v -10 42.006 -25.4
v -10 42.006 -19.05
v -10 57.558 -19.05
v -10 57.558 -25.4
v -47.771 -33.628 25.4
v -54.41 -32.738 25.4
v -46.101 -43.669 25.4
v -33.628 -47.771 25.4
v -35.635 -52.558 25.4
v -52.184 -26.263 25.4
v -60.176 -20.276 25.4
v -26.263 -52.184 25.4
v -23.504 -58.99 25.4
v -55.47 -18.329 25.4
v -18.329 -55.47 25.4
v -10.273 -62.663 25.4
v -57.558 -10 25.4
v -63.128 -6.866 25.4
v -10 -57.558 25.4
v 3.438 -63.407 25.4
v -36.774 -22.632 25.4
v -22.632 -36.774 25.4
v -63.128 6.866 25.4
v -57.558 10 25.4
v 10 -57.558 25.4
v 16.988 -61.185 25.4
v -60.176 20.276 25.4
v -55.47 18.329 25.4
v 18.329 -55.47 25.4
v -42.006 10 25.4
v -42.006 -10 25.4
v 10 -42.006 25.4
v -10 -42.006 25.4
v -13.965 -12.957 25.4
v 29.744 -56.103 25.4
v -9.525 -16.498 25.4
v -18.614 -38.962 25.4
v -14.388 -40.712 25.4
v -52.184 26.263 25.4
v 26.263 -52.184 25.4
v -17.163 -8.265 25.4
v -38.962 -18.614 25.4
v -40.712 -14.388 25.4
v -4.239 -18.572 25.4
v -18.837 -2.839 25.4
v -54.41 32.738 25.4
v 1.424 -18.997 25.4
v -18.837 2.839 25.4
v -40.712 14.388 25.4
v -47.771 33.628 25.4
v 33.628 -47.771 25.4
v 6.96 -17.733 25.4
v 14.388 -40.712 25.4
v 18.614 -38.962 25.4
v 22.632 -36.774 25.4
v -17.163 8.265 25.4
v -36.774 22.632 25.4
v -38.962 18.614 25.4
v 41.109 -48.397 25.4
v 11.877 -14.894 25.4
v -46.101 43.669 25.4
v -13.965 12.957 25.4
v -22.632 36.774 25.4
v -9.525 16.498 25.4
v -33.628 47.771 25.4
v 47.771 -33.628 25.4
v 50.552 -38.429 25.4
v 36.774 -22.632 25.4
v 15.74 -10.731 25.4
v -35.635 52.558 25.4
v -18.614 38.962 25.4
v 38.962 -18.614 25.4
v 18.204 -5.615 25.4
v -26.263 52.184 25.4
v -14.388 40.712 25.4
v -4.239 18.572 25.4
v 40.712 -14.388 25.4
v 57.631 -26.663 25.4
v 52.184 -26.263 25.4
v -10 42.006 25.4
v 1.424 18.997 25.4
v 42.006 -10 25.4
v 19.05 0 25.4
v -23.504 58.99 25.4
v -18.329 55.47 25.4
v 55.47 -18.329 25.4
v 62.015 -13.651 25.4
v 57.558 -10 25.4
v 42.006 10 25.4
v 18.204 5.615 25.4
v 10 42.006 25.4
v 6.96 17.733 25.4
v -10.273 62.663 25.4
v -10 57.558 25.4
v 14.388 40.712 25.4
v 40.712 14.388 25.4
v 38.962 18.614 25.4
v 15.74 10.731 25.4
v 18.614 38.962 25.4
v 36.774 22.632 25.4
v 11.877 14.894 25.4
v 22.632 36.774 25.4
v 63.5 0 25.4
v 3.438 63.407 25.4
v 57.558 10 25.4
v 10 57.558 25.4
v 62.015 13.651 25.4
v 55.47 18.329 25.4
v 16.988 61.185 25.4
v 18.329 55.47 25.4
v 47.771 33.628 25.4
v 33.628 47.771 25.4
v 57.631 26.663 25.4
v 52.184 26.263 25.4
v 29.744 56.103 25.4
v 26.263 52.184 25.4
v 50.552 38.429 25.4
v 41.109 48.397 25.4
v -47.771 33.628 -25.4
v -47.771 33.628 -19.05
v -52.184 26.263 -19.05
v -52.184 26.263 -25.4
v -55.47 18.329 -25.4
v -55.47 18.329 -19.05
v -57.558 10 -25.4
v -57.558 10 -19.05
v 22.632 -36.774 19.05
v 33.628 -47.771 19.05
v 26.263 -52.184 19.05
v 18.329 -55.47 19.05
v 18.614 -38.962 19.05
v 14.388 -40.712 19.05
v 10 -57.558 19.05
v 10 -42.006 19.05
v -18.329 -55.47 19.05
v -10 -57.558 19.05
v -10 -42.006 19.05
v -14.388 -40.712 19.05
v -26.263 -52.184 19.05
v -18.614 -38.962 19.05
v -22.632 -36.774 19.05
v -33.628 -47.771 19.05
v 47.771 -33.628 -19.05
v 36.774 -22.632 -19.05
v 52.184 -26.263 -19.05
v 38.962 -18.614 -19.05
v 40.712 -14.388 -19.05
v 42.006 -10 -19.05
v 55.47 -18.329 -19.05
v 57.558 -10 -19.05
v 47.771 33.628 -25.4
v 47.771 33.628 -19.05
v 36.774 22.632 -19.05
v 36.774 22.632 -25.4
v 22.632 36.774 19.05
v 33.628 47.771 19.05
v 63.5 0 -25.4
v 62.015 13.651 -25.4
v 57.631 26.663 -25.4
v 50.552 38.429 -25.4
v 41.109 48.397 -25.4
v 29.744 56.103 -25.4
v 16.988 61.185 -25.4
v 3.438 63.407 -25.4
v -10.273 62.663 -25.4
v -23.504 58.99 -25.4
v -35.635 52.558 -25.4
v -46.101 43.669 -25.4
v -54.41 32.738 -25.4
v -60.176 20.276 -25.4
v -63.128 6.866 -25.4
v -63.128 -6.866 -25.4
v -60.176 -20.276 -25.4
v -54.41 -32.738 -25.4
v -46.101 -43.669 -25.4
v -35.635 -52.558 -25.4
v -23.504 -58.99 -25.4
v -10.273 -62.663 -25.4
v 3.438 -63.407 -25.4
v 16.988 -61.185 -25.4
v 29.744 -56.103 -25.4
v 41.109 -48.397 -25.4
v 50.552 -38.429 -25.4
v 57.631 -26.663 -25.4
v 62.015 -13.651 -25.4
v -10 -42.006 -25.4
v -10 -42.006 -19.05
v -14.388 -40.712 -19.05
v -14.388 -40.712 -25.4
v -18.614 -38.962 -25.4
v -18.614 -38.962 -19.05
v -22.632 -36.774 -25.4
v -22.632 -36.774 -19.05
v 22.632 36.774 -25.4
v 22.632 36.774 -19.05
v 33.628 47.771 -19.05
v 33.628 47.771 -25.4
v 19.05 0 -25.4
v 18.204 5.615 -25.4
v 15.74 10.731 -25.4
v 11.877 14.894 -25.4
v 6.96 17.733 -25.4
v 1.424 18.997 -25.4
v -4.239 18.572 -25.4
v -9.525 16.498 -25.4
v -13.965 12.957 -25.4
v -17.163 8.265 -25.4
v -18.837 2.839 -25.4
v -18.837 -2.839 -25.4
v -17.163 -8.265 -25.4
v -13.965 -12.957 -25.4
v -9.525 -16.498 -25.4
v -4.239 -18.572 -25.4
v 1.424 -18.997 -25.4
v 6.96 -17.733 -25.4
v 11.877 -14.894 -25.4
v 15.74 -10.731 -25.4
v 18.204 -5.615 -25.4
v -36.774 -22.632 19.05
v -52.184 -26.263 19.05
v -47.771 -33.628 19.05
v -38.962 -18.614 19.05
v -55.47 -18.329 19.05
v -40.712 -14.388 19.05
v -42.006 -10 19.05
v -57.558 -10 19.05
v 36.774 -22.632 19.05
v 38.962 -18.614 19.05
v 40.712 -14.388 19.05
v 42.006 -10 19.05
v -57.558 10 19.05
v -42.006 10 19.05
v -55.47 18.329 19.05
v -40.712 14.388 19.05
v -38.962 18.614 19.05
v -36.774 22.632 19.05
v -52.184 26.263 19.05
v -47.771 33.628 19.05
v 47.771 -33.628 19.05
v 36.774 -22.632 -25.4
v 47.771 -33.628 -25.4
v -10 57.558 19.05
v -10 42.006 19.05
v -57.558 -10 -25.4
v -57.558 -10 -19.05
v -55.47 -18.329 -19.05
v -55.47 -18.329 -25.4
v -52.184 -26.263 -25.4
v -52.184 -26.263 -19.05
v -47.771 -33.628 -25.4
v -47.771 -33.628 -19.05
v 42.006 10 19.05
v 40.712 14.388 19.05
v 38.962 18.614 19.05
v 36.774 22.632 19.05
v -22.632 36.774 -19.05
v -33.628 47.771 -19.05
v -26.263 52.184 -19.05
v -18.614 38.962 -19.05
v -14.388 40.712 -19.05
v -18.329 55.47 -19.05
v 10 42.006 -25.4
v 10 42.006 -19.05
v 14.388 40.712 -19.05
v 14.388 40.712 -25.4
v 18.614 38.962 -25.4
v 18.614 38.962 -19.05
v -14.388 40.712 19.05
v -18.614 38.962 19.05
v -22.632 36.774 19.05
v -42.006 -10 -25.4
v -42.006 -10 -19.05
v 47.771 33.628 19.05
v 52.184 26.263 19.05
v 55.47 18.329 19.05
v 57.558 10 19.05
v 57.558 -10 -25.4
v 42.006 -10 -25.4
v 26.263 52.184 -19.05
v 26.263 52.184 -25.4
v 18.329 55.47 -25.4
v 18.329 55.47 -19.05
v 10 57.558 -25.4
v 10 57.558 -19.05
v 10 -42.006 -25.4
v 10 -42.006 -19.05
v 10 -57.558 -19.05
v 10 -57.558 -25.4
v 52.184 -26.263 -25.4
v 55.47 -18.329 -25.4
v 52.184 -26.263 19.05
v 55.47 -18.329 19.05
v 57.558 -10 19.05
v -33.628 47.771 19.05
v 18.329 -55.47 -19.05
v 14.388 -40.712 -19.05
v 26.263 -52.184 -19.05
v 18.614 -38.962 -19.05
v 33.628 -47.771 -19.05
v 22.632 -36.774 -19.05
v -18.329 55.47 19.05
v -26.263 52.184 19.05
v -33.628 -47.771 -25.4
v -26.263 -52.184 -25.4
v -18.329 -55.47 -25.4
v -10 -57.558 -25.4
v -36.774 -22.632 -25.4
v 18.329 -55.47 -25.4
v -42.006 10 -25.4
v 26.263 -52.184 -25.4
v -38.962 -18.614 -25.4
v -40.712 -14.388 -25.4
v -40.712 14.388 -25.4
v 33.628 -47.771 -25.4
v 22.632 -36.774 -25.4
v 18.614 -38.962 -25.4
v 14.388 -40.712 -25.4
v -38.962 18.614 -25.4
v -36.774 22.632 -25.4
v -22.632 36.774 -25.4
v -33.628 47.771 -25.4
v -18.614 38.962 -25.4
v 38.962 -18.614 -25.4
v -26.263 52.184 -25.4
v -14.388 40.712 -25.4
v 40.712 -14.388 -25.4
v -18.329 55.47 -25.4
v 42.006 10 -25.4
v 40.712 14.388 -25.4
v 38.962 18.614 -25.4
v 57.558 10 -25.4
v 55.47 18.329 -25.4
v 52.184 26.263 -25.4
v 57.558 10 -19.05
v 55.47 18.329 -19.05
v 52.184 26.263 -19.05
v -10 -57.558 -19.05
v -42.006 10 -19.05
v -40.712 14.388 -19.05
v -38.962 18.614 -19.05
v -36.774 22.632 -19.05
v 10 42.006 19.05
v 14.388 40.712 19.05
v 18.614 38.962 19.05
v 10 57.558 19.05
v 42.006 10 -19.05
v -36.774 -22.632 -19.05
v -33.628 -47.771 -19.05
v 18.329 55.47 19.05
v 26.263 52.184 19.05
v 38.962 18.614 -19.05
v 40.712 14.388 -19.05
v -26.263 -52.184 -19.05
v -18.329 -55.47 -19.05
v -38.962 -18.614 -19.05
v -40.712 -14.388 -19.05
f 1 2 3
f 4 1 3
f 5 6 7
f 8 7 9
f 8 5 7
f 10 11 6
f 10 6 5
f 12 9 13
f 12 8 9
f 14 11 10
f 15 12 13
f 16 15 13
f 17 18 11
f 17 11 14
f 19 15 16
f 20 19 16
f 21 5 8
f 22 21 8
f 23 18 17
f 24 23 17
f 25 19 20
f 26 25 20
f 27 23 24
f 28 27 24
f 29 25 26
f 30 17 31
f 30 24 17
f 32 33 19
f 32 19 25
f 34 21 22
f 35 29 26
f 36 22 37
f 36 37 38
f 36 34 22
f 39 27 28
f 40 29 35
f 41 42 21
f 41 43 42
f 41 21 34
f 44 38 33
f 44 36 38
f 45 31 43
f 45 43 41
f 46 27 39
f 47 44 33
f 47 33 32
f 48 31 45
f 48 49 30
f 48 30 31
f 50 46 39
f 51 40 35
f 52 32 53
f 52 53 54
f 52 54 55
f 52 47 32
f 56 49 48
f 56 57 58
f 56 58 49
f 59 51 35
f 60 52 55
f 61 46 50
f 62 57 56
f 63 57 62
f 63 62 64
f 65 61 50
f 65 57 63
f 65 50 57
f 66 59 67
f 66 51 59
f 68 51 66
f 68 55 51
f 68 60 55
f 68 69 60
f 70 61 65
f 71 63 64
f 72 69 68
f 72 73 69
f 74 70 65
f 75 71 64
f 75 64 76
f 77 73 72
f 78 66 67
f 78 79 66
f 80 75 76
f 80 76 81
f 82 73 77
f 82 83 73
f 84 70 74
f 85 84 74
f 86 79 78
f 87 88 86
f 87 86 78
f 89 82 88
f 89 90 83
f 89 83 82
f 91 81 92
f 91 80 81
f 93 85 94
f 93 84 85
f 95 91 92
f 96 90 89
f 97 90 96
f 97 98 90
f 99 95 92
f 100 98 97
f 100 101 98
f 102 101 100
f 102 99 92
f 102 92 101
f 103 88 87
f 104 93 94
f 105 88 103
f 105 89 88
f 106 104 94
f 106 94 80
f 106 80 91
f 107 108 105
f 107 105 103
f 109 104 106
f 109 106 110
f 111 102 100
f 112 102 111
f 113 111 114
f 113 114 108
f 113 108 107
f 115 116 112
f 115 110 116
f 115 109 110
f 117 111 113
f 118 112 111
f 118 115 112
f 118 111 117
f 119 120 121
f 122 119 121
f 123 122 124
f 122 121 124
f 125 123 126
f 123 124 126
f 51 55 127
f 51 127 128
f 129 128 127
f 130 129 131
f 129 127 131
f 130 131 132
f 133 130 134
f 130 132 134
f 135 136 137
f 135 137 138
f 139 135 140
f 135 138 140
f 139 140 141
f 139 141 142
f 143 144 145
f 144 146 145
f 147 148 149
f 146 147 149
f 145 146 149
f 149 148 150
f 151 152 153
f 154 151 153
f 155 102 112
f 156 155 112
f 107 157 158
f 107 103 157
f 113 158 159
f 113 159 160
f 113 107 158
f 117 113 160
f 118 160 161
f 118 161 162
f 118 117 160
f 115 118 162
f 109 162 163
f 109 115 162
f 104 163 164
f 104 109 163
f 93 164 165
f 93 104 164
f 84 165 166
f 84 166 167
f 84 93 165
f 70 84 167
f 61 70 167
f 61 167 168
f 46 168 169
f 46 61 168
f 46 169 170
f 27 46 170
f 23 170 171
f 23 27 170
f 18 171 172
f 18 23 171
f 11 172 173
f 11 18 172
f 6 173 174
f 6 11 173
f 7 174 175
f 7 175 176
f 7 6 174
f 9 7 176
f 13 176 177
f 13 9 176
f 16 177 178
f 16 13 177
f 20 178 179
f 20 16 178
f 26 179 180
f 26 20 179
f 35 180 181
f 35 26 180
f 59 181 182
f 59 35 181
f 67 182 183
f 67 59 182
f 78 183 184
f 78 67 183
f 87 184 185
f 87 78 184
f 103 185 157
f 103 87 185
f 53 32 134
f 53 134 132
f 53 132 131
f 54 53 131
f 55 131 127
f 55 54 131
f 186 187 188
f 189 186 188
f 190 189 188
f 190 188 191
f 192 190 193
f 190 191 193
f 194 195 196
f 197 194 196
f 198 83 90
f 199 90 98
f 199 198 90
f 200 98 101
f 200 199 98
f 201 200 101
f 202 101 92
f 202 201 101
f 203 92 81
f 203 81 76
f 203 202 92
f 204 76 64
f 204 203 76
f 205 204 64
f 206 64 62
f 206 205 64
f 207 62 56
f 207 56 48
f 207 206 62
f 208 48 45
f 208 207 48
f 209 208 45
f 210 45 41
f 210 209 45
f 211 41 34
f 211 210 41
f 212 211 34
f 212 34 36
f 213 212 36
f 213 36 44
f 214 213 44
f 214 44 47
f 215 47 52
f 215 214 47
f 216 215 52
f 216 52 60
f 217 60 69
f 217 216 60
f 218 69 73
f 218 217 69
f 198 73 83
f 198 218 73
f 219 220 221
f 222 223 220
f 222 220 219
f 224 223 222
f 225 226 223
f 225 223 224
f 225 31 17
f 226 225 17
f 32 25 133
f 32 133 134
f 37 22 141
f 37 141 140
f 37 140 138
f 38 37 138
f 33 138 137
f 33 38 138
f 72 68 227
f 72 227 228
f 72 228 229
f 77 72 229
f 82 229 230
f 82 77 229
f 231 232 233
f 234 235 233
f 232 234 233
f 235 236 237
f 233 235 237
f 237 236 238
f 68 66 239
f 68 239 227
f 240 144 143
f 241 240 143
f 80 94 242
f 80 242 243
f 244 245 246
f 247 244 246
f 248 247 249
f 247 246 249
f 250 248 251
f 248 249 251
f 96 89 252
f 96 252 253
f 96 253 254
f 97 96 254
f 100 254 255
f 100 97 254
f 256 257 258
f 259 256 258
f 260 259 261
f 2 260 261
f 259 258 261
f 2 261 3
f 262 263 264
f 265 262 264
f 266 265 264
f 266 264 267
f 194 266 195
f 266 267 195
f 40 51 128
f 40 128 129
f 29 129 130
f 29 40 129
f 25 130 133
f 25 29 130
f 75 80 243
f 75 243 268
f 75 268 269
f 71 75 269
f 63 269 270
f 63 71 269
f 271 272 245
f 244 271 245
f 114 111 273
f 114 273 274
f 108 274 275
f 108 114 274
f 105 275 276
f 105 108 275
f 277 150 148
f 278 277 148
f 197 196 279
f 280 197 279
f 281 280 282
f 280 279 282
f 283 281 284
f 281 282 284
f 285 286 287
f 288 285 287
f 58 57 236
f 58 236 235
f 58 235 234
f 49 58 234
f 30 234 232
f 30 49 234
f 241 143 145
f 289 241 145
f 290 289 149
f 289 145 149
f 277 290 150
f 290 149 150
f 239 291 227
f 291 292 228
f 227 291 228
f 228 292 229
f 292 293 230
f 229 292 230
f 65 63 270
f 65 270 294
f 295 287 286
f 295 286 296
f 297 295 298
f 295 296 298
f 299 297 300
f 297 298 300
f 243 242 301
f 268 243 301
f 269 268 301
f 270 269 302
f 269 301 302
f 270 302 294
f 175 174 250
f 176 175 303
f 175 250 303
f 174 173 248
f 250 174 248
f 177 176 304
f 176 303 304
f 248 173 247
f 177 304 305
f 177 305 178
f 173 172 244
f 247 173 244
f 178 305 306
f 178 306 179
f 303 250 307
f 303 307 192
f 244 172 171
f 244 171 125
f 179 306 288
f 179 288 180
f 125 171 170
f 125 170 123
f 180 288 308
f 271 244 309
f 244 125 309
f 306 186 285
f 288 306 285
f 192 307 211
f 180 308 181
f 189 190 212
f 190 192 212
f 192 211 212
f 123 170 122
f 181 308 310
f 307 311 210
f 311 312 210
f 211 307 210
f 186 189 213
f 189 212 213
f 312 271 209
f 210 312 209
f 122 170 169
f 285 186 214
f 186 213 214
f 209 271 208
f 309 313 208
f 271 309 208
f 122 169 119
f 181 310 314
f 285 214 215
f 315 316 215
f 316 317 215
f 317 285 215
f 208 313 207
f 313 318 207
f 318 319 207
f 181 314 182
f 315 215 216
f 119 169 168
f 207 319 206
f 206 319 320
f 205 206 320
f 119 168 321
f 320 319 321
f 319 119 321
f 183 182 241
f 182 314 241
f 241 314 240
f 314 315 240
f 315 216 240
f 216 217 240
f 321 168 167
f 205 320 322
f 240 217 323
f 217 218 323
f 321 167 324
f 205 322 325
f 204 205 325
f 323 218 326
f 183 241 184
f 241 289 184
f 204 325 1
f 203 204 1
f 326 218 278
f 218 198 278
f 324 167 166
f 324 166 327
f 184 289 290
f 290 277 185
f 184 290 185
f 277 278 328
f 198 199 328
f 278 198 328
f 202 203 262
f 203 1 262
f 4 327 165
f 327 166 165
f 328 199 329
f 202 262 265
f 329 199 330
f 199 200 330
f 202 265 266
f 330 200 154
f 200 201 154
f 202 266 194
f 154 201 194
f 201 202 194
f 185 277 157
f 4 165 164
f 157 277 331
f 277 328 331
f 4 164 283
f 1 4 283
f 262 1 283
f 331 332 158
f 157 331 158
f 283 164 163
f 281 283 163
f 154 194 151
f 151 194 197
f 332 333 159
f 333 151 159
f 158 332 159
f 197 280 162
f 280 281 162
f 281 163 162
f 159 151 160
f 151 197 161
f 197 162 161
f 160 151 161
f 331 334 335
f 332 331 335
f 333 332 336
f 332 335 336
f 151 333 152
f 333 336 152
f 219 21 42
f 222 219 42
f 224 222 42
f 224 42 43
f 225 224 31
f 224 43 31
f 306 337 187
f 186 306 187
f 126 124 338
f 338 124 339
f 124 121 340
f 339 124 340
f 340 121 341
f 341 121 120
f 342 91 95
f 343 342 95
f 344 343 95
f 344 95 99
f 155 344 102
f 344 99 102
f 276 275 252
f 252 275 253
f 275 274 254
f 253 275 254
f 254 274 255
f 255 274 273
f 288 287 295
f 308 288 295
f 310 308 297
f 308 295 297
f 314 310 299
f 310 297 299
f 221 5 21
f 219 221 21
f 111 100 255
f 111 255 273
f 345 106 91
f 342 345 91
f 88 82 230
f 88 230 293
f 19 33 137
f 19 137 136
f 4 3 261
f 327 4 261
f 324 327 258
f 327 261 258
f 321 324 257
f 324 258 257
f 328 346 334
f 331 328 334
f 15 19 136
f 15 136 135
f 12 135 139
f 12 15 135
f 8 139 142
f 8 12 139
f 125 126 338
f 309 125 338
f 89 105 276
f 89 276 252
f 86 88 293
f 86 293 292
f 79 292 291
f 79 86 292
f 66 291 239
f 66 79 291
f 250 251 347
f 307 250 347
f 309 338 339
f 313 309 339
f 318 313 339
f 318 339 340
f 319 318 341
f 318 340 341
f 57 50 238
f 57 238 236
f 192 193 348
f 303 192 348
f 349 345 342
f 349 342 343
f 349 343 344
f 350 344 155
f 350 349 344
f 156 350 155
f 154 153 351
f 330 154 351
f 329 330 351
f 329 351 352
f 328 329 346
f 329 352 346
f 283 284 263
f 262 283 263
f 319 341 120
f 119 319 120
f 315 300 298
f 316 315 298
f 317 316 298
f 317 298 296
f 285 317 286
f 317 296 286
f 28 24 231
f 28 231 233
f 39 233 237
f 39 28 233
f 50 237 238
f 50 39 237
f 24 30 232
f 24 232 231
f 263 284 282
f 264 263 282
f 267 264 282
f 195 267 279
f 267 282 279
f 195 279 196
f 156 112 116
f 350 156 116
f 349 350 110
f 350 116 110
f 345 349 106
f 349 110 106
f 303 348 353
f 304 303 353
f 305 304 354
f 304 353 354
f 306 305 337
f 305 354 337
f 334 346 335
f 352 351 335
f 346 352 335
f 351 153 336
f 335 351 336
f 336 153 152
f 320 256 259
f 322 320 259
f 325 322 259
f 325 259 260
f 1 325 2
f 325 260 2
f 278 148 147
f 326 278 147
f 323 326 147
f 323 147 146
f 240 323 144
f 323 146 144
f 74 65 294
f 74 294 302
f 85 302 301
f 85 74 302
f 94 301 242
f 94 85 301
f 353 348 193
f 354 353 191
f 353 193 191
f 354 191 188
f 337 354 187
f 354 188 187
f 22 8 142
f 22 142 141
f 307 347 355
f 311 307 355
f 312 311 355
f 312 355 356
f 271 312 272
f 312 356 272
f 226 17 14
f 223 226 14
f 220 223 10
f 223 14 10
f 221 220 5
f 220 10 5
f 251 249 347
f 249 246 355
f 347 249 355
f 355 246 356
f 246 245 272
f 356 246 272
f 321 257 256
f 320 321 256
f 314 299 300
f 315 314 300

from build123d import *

# Parameters (mm, degrees)
SKETCH1_R           = 63.5
SKETCH1_R_2         = 19.05
BOSS_EXTRUDE1_DEPTH = 25.4
CUT_EXTRUDE1_DEPTH  = 6.35
CUT_EXTRUDE2_START  = -6.35
CUT_EXTRUDE2_DEPTH  = 6.35


with BuildPart() as part:
    # Sketch1 → Boss-Extrude1 (new, symmetric)
    with BuildSketch(Plane.XY):
        Circle(SKETCH1_R)
        Circle(SKETCH1_R_2, mode=Mode.SUBTRACT)
    extrude(amount=BOSS_EXTRUDE1_DEPTH, both=True)

    # Sketch3 → Cut-Extrude1 (cut)
    with BuildSketch(Plane.XY.offset(25.4)):
        with BuildLine():
            Line((36.77386566, 22.631730036), (47.770554295, 33.628418671))
            ThreePointArc((47.770554295, 33.628418671), (53.973042289, 22.356366119), (57.557765766, 10))
            Line((57.557765766, 10), (42.006099557, 10))
            ThreePointArc((42.006099557, 10), (39.893118214, 16.52427061), (36.77386566, 22.631730036))
        make_face()
        with BuildLine():
            Line((47.770554295, -33.628418671), (36.77386566, -22.631730036))
            ThreePointArc((36.77386566, -22.631730036), (39.893118214, -16.52427061), (42.006099557, -10))
            Line((42.006099557, -10), (57.557765766, -10))
            ThreePointArc((57.557765766, -10), (53.973042289, -22.356366119), (47.770554295, -33.628418671))
        make_face()
        with BuildLine():
            Line((10, -57.557765766), (10, -42.006099557))
            ThreePointArc((10, -42.006099557), (16.52427061, -39.893118214), (22.631730036, -36.77386566))
            Line((22.631730036, -36.77386566), (33.628418671, -47.770554295))
            ThreePointArc((33.628418671, -47.770554295), (22.356366119, -53.973042289), (10, -57.557765766))
        make_face()
        with BuildLine():
            Line((-33.628418671, -47.770554295), (-22.631730036, -36.77386566))
            ThreePointArc((-22.631730036, -36.77386566), (-16.52427061, -39.893118214), (-10, -42.006099557))
            Line((-10, -42.006099557), (-10, -57.557765766))
            ThreePointArc((-10, -57.557765766), (-22.356366119, -53.973042289), (-33.628418671, -47.770554295))
        make_face()
        with BuildLine():
            Line((-42.006099557, 10), (-57.557765766, 10))
            ThreePointArc((-57.557765766, 10), (-53.973042289, 22.356366119), (-47.770554295, 33.628418671))
            Line((-47.770554295, 33.628418671), (-36.77386566, 22.631730036))
            ThreePointArc((-36.77386566, 22.631730036), (-39.893118214, 16.52427061), (-42.006099557, 10))
        make_face()
        with BuildLine():
            Line((22.631730036, 36.77386566), (33.628418671, 47.770554295))
            ThreePointArc((33.628418671, 47.770554295), (22.356366119, 53.973042289), (10, 57.557765766))
            Line((10, 57.557765766), (10, 42.006099557))
            ThreePointArc((10, 42.006099557), (16.52427061, 39.893118214), (22.631730036, 36.77386566))
        make_face()
        with BuildLine():
            Line((-47.770554295, -33.628418671), (-36.77386566, -22.631730036))
            ThreePointArc((-36.77386566, -22.631730036), (-39.893118214, -16.52427061), (-42.006099557, -10))
            Line((-42.006099557, -10), (-57.557765766, -10))
            ThreePointArc((-57.557765766, -10), (-53.973042289, -22.356366119), (-47.770554295, -33.628418671))
        make_face()
        with BuildLine():
            Line((-22.631730036, 36.77386566), (-33.628418671, 47.770554295))
            ThreePointArc((-33.628418671, 47.770554295), (-22.356366119, 53.973042289), (-10, 57.557765766))
            Line((-10, 57.557765766), (-10, 42.006099557))
            ThreePointArc((-10, 42.006099557), (-16.52427061, 39.893118214), (-22.631730036, 36.77386566))
        make_face()
    extrude(amount=-CUT_EXTRUDE1_DEPTH, mode=Mode.SUBTRACT)

    # Sketch4 → Cut-Extrude2 (cut)
    with BuildSketch(Plane(origin=(0, 0, -25.4), x_dir=(-1, 0, 0), z_dir=(0, 0, -1)).offset(CUT_EXTRUDE2_START)):
        with BuildLine():
            Line((-36.77386566, -22.631730036), (-47.770554295, -33.628418671))
            ThreePointArc((-47.770554295, -33.628418671), (-53.973042289, -22.356366119), (-57.557765766, -10))
            Line((-57.557765766, -10), (-42.006099557, -10))
            ThreePointArc((-42.006099557, -10), (-39.893118214, -16.52427061), (-36.77386566, -22.631730036))
        make_face()
        with BuildLine():
            Line((-10, -42.006099557), (-10, -57.557765766))
            ThreePointArc((-10, -57.557765766), (-22.356366119, -53.973042289), (-33.628418671, -47.770554295))
            Line((-33.628418671, -47.770554295), (-22.631730036, -36.77386566))
            ThreePointArc((-22.631730036, -36.77386566), (-16.52427061, -39.893118214), (-10, -42.006099557))
        make_face()
        with BuildLine():
            Line((22.631730036, -36.77386566), (33.628418671, -47.770554295))
            ThreePointArc((33.628418671, -47.770554295), (22.356366119, -53.973042289), (10, -57.557765766))
            Line((10, -57.557765766), (10, -42.006099557))
            ThreePointArc((10, -42.006099557), (16.52427061, -39.893118214), (22.631730036, -36.77386566))
        make_face()
        with BuildLine():
            Line((42.006099557, -10), (57.557765766, -10))
            ThreePointArc((57.557765766, -10), (53.973042289, -22.356366119), (47.770554295, -33.628418671))
            Line((47.770554295, -33.628418671), (36.77386566, -22.631730036))
            ThreePointArc((36.77386566, -22.631730036), (39.893118214, -16.52427061), (42.006099557, -10))
        make_face()
        with BuildLine():
            Line((36.77386566, 22.631730036), (47.770554295, 33.628418671))
            ThreePointArc((47.770554295, 33.628418671), (53.973042289, 22.356366119), (57.557765766, 10))
            Line((57.557765766, 10), (42.006099557, 10))
            ThreePointArc((42.006099557, 10), (39.893118214, 16.52427061), (36.77386566, 22.631730036))
        make_face()
        with BuildLine():
            Line((10, 42.006099557), (10, 57.557765766))
            ThreePointArc((10, 57.557765766), (22.356366119, 53.973042289), (33.628418671, 47.770554295))
            Line((33.628418671, 47.770554295), (22.631730036, 36.77386566))
            ThreePointArc((22.631730036, 36.77386566), (16.52427061, 39.893118214), (10, 42.006099557))
        make_face()
        with BuildLine():
            Line((-22.631730036, 36.77386566), (-33.628418671, 47.770554295))
            ThreePointArc((-33.628418671, 47.770554295), (-22.356366119, 53.973042289), (-10, 57.557765766))
            Line((-10, 57.557765766), (-10, 42.006099557))
            ThreePointArc((-10, 42.006099557), (-16.52427061, 39.893118214), (-22.631730036, 36.77386566))
        make_face()
        with BuildLine():
            Line((-42.006099557, 10), (-57.557765766, 10))
            ThreePointArc((-57.557765766, 10), (-53.973042289, 22.356366119), (-47.770554295, 33.628418671))
            Line((-47.770554295, 33.628418671), (-36.77386566, 22.631730036))
            ThreePointArc((-36.77386566, 22.631730036), (-39.893118214, 16.52427061), (-42.006099557, 10))
        make_face()
    extrude(amount=CUT_EXTRUDE2_DEPTH, mode=Mode.SUBTRACT)


solid = part.part
